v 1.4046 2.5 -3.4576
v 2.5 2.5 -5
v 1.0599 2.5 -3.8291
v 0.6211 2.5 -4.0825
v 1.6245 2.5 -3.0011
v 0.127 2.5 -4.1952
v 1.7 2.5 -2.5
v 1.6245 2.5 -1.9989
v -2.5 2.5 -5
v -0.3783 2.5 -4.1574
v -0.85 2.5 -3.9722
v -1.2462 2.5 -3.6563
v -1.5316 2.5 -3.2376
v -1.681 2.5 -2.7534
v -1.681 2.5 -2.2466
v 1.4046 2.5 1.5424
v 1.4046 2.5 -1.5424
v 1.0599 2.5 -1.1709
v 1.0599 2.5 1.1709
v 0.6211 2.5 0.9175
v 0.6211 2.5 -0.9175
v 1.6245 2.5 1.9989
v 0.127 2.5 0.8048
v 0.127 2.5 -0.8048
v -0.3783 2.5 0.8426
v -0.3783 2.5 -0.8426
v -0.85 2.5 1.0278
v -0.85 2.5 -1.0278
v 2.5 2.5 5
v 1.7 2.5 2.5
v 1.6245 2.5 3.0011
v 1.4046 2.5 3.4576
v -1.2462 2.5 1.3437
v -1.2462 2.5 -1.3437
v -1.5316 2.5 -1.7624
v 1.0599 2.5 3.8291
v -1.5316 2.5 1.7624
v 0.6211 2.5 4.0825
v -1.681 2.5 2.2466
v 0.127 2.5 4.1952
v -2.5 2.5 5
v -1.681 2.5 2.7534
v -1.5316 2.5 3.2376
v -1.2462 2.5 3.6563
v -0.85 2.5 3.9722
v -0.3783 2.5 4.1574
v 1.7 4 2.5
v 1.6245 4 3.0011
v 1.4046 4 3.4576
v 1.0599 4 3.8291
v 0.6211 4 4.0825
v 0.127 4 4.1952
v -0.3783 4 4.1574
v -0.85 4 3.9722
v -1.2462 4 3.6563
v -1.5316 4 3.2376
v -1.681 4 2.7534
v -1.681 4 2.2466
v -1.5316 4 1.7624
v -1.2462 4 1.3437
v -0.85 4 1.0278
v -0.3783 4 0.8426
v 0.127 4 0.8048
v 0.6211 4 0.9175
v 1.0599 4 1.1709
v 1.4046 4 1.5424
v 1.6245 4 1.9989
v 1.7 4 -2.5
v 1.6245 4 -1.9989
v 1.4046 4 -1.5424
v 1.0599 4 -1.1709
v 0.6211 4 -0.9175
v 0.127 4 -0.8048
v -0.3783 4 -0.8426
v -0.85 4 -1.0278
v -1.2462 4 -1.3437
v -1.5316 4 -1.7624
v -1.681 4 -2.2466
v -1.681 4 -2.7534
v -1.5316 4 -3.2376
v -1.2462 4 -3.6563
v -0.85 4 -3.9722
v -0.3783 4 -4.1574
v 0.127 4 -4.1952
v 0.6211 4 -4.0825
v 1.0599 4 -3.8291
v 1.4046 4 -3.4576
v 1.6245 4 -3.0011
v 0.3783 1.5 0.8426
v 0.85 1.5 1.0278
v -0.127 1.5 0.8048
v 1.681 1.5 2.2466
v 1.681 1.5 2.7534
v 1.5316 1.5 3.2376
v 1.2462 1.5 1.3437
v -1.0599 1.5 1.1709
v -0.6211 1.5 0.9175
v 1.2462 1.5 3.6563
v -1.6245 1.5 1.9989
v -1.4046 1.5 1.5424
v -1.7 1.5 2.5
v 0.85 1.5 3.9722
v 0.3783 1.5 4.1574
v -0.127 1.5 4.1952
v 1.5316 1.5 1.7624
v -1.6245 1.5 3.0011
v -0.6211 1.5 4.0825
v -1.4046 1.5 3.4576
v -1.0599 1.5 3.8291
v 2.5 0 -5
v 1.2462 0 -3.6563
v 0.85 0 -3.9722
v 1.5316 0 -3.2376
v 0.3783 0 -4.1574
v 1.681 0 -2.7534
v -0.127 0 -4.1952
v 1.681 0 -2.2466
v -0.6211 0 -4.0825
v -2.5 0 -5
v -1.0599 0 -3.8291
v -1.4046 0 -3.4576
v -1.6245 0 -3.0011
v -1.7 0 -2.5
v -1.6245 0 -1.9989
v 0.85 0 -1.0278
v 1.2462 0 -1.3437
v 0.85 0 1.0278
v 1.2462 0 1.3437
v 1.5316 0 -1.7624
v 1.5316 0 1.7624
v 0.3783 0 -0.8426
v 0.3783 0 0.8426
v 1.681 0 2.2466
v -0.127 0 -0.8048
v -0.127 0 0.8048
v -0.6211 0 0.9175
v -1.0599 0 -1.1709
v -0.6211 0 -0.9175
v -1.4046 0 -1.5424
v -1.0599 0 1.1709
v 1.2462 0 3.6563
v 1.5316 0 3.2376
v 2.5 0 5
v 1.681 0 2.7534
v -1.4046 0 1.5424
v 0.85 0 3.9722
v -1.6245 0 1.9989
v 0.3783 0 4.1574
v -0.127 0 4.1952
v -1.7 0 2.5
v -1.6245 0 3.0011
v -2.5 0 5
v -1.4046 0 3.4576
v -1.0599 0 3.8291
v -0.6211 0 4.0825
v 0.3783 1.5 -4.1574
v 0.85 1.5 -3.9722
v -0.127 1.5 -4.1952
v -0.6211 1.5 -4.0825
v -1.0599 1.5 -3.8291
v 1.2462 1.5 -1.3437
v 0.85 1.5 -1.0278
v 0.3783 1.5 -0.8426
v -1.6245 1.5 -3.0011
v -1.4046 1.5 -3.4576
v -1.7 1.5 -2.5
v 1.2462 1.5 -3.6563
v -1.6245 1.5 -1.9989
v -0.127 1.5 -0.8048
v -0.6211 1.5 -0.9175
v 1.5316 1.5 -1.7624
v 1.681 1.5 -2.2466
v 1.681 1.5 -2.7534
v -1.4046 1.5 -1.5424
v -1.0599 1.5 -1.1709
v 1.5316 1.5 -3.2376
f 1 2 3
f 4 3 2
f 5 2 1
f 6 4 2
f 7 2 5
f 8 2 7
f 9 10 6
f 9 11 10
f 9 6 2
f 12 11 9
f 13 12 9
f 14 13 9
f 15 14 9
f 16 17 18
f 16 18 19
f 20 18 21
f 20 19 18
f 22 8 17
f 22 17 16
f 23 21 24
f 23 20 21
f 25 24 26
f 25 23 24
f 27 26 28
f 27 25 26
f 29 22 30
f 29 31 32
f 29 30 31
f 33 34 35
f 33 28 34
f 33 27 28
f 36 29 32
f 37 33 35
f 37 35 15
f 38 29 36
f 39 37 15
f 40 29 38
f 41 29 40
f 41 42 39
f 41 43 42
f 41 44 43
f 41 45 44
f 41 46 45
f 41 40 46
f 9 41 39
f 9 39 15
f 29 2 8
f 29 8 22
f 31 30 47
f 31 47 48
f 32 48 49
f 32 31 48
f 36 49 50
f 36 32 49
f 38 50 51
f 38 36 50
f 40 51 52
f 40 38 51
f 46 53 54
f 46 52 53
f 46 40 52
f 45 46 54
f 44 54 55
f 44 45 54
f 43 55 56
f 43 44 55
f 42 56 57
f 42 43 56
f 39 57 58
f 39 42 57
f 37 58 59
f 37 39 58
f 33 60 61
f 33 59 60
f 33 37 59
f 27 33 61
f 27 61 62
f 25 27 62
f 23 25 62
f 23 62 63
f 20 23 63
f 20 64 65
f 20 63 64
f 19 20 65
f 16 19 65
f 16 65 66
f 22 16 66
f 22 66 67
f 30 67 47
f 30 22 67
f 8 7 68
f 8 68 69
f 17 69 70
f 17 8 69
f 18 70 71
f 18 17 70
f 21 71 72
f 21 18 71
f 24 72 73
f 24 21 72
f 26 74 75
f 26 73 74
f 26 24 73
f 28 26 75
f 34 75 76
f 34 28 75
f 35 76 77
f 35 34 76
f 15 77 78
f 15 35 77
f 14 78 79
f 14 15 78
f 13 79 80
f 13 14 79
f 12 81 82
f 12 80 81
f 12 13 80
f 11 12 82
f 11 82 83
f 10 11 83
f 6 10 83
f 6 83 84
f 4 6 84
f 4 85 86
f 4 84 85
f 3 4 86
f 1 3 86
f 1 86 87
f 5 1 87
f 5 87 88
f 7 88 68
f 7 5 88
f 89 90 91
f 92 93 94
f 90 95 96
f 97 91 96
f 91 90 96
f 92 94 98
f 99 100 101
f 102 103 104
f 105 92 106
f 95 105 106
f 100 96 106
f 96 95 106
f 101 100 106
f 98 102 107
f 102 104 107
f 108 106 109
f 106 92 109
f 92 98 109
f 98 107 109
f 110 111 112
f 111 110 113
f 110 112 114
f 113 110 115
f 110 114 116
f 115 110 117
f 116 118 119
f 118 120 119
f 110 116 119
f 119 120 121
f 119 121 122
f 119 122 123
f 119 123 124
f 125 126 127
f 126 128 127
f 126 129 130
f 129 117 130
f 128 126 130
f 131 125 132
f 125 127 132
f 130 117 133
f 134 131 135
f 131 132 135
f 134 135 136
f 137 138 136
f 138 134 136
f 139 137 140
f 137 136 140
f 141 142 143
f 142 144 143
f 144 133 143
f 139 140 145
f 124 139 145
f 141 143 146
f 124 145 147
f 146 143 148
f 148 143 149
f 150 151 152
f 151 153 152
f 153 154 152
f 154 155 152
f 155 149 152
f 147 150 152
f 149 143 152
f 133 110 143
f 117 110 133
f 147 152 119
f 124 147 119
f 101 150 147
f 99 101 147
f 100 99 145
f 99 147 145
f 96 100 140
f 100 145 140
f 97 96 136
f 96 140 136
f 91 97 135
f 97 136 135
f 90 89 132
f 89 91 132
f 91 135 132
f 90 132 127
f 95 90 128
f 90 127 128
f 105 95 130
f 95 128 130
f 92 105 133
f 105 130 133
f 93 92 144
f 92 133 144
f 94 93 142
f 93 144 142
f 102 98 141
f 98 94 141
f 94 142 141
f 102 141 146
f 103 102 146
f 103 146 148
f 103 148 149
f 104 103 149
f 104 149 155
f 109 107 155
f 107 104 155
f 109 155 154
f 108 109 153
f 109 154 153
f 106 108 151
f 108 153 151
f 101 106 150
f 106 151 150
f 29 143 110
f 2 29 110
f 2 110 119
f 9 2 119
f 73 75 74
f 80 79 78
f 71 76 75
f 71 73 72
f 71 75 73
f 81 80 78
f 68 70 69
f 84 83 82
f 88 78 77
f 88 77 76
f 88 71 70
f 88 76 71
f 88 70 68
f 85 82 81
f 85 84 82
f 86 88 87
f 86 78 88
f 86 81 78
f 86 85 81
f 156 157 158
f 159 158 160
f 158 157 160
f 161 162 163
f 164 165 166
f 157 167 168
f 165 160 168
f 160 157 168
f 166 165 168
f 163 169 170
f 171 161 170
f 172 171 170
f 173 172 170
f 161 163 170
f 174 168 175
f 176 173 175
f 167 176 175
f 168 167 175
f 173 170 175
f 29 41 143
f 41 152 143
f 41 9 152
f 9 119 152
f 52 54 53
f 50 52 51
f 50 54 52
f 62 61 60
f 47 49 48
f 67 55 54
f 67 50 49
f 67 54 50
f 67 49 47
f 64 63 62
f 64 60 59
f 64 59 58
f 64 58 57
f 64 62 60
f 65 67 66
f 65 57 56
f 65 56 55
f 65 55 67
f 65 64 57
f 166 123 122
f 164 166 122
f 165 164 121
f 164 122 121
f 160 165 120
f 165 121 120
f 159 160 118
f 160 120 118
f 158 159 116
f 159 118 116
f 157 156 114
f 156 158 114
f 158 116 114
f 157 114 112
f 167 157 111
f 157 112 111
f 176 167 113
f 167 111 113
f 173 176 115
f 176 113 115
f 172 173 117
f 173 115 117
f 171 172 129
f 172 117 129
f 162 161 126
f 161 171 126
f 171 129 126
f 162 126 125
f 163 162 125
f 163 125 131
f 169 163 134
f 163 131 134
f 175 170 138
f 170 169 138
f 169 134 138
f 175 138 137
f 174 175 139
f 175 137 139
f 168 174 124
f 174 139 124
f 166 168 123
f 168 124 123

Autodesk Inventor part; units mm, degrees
ref_plane "YZ Plane" through (0, 0, 0) normal (1, 0, 0) x (0, 1, 0)
ref_plane "XZ Plane" through (0, 0, 0) normal (0, 1, 0) x (-1, 0, 0)
ref_plane "XY Plane" through (0, 0, 0) normal (0, 0, 1) x (1, 0, 0)
sketch "草圖1" plane through (0, 0, 0) normal (0, 1, 0) x (-1, 0, 0)
  line L0 (2.5, 5) -> (-2.5, 5)
  line L1 (-2.5, 5) -> (-2.5, -5)
  line L2 (-2.5, -5) -> (2.5, -5)
  line L3 (2.5, -5) -> (2.5, 5)
  circle A0 centre (0, 2.5) radius 1.7
  line L4 (2.5, 0) -> (-2.5, 0) construction
  circle A1 centre (0, -2.5) radius 1.7
  point P0 (0, 0)
  point P1 (0, -5)
  dimension "d0" = 5
  dimension "d1" = 10
  dimension "d2" = 3.4
  dimension "d3" = 2.5
  dimension "d4" = 2.5
extrude "擠出1" add sketch "草圖1" along normal blind 2.5 contours L3 L2 L1 L0 | A0 | A1
extrude "擠出2" cut sketch "草圖1" along normal blind 1.5 contours A0 | A1
sketch "草圖2" plane through (0, 2.5, 0) normal (0, 1, 0) x (1, 0, 0)
  circle A0 centre (0, -2.5) radius 1.7 projected
  circle A1 centre (0, 2.5) radius 1.7 projected
  point P0 (0, 0)
extrude "擠出3" add sketch "草圖2" along normal blind 1.5
properties part number "110033226_ipt_06_磚塊樺木(2x1)"
